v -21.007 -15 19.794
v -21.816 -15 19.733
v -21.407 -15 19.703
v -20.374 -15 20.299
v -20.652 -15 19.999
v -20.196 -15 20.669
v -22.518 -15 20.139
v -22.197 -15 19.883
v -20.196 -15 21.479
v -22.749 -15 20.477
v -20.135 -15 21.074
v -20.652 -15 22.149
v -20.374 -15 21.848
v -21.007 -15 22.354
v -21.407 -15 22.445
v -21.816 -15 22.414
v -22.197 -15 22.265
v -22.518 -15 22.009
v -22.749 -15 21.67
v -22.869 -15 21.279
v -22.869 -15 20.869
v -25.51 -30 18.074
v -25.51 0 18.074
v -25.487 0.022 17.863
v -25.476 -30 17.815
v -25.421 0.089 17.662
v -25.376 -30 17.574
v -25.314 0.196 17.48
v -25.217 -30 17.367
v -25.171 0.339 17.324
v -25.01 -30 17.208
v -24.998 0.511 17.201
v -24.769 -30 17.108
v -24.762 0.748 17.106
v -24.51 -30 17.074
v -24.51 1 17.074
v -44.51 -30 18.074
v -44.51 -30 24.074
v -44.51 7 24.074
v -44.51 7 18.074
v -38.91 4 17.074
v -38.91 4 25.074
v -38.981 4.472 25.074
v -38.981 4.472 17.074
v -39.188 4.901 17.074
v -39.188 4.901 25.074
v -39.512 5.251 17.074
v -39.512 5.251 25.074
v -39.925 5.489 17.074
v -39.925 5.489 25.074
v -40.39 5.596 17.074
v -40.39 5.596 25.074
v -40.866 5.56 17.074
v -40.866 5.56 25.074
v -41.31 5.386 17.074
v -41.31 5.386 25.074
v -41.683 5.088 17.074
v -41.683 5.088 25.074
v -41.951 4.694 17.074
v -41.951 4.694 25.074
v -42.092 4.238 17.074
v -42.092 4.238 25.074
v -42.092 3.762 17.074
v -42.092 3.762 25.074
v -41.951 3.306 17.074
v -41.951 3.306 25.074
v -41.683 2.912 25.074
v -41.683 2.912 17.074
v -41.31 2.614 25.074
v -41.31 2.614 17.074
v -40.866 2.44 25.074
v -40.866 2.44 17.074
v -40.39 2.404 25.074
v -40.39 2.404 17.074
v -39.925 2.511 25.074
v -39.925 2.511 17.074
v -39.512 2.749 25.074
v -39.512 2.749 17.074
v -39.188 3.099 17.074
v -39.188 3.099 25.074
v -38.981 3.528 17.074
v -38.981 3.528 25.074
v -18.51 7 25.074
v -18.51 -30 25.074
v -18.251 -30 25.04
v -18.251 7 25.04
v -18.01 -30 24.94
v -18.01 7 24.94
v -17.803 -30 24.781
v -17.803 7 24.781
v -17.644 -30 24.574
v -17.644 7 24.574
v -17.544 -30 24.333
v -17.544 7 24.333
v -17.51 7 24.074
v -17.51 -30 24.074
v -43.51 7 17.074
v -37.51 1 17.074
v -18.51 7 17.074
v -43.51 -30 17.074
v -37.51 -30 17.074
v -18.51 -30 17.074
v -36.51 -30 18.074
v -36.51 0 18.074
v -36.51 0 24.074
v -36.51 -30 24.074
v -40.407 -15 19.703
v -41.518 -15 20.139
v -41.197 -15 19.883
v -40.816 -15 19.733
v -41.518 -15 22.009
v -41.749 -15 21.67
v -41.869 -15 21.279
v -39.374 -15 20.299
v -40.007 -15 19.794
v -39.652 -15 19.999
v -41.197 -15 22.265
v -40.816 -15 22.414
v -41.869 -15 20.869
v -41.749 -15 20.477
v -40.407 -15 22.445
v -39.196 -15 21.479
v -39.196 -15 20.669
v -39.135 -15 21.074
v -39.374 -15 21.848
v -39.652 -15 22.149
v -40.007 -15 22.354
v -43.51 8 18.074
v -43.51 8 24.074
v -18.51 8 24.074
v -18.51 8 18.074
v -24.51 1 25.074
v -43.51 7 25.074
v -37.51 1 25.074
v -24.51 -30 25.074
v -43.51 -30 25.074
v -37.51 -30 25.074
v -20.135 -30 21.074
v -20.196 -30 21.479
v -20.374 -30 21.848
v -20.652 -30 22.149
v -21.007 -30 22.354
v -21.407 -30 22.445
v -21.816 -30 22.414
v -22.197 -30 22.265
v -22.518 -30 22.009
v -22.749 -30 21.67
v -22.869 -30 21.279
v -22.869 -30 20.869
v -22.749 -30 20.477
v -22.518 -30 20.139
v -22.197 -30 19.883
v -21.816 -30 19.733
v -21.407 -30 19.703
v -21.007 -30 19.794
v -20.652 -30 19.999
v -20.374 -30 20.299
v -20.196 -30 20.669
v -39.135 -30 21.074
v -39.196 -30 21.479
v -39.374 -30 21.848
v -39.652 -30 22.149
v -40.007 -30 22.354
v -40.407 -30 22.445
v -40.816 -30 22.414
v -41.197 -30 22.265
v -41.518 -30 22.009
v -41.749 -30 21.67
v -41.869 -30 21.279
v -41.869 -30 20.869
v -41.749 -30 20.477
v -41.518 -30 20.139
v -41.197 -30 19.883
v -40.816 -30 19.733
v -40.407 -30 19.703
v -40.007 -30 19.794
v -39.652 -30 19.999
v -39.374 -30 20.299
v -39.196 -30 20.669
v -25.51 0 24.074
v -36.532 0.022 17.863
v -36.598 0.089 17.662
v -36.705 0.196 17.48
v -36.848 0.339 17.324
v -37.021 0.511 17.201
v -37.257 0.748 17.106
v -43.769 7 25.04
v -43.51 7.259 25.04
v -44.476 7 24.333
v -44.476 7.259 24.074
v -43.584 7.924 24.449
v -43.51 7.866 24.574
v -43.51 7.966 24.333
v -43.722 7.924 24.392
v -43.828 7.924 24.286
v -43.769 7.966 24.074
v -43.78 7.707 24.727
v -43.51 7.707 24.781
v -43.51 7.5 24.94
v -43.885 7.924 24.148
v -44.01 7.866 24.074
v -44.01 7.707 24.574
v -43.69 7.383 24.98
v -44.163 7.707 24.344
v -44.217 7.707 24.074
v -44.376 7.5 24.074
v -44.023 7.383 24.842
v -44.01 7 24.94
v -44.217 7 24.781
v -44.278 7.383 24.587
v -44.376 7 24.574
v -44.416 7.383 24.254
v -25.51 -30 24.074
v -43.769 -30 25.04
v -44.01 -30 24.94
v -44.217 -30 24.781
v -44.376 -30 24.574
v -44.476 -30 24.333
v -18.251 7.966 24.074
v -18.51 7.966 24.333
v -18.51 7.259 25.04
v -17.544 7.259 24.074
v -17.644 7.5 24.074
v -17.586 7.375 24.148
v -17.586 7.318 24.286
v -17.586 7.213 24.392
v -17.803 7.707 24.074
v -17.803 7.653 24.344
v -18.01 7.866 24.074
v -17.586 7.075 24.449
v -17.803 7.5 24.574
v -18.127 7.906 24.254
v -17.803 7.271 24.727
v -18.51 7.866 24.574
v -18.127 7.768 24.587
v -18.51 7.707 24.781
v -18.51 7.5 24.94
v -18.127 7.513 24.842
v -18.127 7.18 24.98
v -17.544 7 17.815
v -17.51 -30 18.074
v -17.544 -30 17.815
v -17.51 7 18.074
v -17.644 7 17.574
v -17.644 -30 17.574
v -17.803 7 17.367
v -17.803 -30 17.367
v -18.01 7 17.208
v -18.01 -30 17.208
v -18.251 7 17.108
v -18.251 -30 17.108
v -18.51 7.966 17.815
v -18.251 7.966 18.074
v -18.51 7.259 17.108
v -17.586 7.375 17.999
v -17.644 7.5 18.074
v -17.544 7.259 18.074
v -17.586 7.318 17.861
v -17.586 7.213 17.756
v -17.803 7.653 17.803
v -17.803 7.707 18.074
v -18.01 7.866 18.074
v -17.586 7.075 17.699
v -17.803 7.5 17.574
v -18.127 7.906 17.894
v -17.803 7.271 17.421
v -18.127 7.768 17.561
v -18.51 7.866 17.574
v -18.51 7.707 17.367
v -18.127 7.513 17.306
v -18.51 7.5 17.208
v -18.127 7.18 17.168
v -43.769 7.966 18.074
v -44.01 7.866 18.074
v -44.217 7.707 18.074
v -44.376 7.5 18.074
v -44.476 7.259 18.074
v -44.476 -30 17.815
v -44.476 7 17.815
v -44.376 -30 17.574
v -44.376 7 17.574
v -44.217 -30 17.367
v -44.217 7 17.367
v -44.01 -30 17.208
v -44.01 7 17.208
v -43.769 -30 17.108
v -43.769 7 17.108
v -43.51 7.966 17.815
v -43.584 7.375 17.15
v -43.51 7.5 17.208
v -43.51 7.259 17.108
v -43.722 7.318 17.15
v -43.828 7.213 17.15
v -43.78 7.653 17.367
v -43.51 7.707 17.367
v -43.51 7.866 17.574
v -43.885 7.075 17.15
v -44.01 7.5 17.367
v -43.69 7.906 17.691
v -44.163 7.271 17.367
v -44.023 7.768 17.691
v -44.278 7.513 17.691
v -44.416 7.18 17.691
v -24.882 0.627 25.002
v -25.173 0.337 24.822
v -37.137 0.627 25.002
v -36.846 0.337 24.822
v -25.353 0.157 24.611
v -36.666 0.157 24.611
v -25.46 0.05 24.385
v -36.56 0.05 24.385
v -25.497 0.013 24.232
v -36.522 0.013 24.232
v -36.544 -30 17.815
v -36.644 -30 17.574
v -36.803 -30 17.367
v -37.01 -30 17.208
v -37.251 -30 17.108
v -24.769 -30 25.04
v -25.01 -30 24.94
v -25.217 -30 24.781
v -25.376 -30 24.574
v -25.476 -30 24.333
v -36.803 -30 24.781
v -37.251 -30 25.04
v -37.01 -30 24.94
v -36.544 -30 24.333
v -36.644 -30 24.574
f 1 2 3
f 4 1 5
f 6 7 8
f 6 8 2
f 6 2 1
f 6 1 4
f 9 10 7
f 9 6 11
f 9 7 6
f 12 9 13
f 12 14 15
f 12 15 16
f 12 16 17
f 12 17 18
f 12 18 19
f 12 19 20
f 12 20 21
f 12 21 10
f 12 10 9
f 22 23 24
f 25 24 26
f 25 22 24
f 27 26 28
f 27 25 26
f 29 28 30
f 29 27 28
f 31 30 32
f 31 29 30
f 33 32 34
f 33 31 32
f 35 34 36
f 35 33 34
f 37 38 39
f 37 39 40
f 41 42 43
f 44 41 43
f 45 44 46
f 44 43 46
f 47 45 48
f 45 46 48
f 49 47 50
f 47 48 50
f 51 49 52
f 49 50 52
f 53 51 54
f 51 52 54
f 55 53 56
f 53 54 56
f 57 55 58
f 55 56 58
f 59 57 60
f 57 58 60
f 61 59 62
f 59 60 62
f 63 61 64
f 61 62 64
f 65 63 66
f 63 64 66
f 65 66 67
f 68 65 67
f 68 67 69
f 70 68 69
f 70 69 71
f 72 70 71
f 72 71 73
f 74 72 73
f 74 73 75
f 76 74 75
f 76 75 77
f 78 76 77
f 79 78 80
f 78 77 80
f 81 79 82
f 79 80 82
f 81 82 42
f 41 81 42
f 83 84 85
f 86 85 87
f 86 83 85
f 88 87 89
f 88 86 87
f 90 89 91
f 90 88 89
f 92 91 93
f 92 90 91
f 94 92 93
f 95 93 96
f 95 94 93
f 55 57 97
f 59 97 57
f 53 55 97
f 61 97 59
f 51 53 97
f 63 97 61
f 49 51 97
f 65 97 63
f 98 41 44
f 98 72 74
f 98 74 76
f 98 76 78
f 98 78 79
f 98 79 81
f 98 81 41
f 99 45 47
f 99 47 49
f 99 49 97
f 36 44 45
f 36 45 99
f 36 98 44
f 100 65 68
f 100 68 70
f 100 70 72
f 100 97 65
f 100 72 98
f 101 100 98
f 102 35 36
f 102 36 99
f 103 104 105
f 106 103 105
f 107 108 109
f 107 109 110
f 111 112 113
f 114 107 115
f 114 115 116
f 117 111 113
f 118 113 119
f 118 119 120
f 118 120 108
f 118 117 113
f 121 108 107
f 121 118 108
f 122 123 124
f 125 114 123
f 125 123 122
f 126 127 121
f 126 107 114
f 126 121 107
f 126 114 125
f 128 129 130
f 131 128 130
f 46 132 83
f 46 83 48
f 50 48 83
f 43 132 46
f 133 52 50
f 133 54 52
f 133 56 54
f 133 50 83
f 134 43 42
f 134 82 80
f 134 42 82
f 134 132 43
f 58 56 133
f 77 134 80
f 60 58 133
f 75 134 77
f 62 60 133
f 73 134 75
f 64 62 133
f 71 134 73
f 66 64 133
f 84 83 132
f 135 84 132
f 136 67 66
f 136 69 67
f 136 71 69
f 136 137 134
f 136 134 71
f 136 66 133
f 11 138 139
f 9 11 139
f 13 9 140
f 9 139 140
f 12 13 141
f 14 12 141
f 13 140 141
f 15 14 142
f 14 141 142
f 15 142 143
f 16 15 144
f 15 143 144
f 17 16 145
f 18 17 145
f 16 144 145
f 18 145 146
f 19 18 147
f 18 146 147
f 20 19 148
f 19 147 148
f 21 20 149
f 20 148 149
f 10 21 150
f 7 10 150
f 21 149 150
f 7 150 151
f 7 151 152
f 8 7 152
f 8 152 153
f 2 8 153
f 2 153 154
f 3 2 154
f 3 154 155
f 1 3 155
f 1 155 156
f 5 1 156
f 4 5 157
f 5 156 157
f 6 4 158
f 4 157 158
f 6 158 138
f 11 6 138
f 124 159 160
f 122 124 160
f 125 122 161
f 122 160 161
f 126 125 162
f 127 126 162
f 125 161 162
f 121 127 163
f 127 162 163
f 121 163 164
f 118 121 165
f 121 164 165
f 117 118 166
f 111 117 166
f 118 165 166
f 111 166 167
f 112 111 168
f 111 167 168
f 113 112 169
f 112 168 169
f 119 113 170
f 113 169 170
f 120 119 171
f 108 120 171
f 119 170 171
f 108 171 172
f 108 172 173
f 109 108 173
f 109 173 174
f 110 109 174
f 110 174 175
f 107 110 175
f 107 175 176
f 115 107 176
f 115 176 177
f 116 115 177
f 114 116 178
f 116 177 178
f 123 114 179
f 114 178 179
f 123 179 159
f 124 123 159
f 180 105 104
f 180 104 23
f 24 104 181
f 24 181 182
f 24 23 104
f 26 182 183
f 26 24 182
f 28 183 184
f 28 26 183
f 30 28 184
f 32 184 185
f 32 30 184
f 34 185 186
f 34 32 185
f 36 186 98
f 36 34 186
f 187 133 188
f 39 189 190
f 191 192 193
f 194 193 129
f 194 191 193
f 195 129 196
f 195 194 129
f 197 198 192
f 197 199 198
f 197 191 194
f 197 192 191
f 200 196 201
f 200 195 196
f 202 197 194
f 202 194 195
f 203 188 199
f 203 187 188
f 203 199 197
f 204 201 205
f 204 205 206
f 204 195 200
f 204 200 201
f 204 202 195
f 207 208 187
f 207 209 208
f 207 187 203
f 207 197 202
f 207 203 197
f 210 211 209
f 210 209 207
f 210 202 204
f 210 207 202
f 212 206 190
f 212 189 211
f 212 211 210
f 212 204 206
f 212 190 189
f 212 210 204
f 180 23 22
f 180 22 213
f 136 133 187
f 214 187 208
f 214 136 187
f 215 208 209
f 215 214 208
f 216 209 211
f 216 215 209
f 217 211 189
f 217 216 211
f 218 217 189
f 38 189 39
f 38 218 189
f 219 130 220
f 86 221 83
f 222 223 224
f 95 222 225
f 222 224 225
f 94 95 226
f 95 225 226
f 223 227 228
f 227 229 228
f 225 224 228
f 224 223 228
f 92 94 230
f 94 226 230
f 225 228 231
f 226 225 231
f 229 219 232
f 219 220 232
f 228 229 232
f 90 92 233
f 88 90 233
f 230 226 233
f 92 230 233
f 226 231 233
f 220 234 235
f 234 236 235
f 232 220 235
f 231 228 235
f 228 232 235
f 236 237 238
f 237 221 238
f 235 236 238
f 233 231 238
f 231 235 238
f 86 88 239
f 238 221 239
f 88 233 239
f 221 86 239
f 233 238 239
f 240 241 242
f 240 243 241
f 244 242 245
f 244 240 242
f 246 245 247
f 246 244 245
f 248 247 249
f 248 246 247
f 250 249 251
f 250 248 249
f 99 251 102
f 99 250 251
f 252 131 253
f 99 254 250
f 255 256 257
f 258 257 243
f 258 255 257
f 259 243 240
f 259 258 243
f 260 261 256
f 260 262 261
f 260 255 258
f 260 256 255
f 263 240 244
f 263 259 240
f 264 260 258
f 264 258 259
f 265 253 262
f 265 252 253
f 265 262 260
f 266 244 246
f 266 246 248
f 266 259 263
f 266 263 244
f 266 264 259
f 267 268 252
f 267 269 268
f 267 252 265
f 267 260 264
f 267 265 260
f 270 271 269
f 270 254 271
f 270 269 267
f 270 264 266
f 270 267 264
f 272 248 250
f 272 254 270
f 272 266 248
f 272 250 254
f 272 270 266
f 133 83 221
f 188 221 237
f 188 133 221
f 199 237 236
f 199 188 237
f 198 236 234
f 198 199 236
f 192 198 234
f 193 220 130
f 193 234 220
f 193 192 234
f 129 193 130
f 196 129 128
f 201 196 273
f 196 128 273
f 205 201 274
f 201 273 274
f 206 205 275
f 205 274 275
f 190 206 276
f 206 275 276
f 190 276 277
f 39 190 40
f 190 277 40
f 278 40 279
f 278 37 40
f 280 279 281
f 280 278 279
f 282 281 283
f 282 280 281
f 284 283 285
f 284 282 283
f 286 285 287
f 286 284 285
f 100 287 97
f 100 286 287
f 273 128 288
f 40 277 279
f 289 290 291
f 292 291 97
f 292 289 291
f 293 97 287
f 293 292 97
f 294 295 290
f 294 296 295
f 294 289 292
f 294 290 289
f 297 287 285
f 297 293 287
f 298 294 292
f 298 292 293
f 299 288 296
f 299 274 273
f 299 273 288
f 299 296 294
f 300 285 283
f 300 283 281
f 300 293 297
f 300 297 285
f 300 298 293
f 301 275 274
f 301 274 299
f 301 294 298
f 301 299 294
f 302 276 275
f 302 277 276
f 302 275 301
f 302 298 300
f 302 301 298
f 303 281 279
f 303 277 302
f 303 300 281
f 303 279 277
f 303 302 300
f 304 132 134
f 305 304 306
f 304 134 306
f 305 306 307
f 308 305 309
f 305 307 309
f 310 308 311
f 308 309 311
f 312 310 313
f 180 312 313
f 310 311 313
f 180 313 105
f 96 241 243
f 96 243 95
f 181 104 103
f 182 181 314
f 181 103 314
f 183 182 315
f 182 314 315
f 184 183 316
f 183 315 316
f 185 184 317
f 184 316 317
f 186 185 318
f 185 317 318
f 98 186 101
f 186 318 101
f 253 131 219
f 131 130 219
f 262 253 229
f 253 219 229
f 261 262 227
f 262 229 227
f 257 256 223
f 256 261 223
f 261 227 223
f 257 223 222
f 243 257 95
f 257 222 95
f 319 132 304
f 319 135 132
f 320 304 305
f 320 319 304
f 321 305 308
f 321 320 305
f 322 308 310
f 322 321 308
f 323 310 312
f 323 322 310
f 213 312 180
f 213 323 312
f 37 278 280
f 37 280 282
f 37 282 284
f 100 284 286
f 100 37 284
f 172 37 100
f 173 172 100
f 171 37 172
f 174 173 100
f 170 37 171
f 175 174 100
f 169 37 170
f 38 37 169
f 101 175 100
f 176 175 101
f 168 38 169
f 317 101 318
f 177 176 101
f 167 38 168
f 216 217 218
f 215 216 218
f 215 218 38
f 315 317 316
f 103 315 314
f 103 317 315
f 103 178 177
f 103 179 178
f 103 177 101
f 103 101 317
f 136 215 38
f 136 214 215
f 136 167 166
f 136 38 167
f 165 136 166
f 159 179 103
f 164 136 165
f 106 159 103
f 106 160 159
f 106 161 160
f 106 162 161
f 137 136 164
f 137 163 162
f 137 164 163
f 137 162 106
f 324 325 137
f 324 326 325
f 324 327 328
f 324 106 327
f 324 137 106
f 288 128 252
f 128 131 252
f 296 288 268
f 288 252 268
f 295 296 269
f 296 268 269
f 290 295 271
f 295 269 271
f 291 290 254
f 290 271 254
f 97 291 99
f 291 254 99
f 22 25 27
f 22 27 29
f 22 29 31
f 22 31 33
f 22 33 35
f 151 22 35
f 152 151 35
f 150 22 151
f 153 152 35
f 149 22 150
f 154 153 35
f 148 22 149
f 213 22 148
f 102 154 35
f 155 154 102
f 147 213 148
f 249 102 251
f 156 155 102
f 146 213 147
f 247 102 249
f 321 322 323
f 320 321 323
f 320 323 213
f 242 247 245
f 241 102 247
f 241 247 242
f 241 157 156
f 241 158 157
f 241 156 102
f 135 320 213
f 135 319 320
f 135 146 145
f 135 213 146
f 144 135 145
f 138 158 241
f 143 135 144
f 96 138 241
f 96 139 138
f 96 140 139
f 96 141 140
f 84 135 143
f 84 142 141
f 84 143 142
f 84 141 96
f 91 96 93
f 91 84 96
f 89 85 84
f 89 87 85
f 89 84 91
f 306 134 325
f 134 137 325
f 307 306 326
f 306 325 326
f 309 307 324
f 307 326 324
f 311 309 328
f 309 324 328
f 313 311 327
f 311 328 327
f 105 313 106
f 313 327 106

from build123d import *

# Parameters (mm, degrees)
F0_W     = 8
F0_H     = 8
F1_DEPTH = 30
F3_DEPTH = 8
F4_R     = 1.6
F5_DEPTH = 8
F7_R     = 1.375
F8_DEPTH = 15
F9_R     = 1


with BuildPart() as f1:
    # F0 (on Front) → F1 (new body)
    with BuildSketch(Plane.XZ):
        with Locations((-40.509796, 21.073834)):
            Rectangle(F0_W, F0_H)
        with Locations((-21.509796, 21.073834)):
            Rectangle(F0_W, F0_H)
    extrude(amount=F1_DEPTH)


with BuildPart() as f3:
    # F2 (on Front) → F3 (new body)
    with BuildSketch(Plane.XZ):
        Polygon((-17.509796, 25.073834), (-25.509796, 25.073834), (-36.509796, 25.073834), (-44.509796, 25.073834), (-44.509796, 17.073834), (-36.509796, 17.073834), (-25.509796, 17.073834), (-17.509796, 17.073834), align=None)
    extrude(amount=-F3_DEPTH)

    # F4 (on face) → F5 (cut, through all)
    with BuildSketch(Plane.XY.offset(25.073834)):
        with Locations((-40.509796, 4)):
            Circle(F4_R)
    extrude(amount=-F5_DEPTH, mode=Mode.SUBTRACT)


with BuildPart() as f1_1:
    add(f1.part)

    # F6: union F3
    add(f3.part)

    # F7 (on face) → F8 (cut)
    with BuildSketch(Plane.XZ.offset(30)):
        with Locations((-40.509796, 21.073834)):
            Circle(F7_R)
        with Locations((-21.509796, 21.073834)):
            Circle(F7_R)
    extrude(amount=-F8_DEPTH, mode=Mode.SUBTRACT)

    # F9
    f9_edges = [f1_1.edges().sort_by_distance(p)[0] for p in [
        (-44.509796, -11, 25.073834),
        (-36.509796, -15, 25.073834),
        (-31.009796, 0, 25.073834),
        (-31.009796, 8, 25.073834),
        (-44.509796, 8, 21.073834),
        (-31.009796, 8, 17.073834),
        (-17.509796, 8, 21.073834),
        (-25.509796, -15, 25.073834),
        (-17.509796, -11, 25.073834),
        (-17.509796, -11, 17.073834),
        (-25.509796, -15, 17.073834),
        (-31.009796, 0, 17.073834),
        (-36.509796, -15, 17.073834),
        (-44.509796, -11, 17.073834),
    ]]
    fillet(f9_edges, radius=F9_R)


solid = f1_1.part
